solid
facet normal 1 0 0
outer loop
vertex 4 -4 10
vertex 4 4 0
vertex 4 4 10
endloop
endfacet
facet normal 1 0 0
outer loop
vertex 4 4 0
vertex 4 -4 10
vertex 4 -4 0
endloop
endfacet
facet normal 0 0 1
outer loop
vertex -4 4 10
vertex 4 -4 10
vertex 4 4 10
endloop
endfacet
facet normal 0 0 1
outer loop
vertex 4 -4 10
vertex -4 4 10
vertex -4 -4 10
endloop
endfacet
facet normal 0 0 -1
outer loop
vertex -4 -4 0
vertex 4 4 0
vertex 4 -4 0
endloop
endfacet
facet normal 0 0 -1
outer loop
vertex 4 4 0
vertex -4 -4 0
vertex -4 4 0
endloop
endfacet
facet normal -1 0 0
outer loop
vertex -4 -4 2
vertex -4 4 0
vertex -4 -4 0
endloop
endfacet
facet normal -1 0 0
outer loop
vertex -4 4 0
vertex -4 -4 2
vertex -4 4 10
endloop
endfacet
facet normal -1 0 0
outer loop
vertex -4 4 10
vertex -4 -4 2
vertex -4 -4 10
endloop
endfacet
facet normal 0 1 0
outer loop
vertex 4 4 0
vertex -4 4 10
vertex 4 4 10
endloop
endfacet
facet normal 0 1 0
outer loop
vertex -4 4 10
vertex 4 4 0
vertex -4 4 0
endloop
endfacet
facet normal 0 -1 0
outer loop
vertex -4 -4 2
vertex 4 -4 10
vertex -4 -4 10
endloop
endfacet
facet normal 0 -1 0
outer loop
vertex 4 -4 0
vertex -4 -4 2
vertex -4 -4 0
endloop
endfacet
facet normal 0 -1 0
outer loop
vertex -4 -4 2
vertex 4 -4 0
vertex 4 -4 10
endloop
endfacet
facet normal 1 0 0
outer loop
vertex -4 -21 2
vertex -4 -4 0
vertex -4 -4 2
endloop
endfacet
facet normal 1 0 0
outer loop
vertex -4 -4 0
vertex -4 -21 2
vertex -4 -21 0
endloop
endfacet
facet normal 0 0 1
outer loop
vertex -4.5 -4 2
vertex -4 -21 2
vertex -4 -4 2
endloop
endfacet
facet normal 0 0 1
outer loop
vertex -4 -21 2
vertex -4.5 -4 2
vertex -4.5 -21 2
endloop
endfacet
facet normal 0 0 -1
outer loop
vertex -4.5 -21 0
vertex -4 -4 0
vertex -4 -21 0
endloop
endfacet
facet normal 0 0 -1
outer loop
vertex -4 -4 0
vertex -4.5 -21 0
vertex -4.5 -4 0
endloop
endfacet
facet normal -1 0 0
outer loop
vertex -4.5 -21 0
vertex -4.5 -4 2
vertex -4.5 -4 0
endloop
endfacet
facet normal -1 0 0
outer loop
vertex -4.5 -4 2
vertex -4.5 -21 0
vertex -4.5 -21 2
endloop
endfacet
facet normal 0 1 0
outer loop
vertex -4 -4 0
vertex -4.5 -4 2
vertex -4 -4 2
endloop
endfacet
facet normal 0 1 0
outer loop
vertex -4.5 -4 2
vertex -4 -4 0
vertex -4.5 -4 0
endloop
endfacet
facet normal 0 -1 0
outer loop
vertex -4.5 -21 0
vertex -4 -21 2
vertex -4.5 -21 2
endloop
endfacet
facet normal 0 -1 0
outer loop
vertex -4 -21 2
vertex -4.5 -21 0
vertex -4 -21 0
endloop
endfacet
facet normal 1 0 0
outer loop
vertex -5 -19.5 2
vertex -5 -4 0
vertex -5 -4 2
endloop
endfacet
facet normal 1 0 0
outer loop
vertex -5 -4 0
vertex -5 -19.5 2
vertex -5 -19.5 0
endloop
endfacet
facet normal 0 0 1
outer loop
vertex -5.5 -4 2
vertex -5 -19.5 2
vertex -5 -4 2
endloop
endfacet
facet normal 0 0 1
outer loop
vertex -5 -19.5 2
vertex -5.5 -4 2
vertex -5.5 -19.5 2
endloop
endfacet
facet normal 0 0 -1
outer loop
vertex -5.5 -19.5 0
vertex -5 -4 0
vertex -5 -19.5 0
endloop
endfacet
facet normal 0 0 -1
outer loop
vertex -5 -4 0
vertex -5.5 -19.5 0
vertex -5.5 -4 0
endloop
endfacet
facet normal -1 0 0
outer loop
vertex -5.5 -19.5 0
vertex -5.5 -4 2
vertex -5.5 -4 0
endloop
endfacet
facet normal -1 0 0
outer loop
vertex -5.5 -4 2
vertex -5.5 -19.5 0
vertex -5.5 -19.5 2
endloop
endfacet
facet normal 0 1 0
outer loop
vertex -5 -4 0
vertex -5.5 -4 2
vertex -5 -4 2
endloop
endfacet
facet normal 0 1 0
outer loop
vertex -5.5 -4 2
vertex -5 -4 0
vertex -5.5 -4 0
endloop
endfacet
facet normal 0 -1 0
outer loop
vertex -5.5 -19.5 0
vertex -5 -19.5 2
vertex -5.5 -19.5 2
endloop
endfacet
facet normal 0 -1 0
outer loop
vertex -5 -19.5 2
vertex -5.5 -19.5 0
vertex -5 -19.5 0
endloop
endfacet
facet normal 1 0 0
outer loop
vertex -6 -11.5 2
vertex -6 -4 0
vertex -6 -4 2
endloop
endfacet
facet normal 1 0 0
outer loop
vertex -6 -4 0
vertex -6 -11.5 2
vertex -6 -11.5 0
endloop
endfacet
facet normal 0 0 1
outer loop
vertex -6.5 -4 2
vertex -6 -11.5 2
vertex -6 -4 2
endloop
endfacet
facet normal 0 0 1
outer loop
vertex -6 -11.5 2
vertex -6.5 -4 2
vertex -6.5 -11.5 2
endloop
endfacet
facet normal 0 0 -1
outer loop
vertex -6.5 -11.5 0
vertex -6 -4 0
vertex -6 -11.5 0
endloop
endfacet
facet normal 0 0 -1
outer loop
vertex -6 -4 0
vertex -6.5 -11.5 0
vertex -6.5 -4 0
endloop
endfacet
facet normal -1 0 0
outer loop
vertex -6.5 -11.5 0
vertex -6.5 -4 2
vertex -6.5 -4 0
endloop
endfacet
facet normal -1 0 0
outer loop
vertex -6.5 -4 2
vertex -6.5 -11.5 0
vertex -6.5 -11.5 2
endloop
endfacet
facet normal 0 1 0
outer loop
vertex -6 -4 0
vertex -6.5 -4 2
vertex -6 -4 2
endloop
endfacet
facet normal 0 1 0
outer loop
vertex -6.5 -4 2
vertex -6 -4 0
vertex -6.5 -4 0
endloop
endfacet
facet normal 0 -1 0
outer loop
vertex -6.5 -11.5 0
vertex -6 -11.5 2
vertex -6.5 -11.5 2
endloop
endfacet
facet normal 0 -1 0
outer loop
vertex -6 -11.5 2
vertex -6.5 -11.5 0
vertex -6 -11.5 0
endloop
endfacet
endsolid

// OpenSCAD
translate([0, 0, 5]) color([0,1,0,0.9]) cube([8, 8, 10], center=true);
translate([-4.25, -4.25, 1]) color([1,0,0]) cube([0.5, 0.5, 2], center=true);
translate([-4.25, -4.75, 1]) color([1,0,0]) cube([0.5, 0.5, 2], center=true);
translate([-4.25, -5.25, 1]) color([1,0,0]) cube([0.5, 0.5, 2], center=true);
translate([-4.25, -5.75, 1]) color([1,0,0]) cube([0.5, 0.5, 2], center=true);
translate([-4.25, -6.25, 1]) color([1,0,0]) cube([0.5, 0.5, 2], center=true);
translate([-4.25, -6.75, 1]) color([1,0,0]) cube([0.5, 0.5, 2], center=true);
translate([-4.25, -7.25, 1]) color([1,0,0]) cube([0.5, 0.5, 2], center=true);
translate([-4.25, -7.75, 1]) color([1,0,0]) cube([0.5, 0.5, 2], center=true);
translate([-4.25, -8.25, 1]) color([1,0,0]) cube([0.5, 0.5, 2], center=true);
translate([-4.25, -8.75, 1]) color([1,0,0]) cube([0.5, 0.5, 2], center=true);
translate([-4.25, -9.25, 1]) color([1,0,0]) cube([0.5, 0.5, 2], center=true);
translate([-4.25, -9.75, 1]) color([1,0,0]) cube([0.5, 0.5, 2], center=true);
translate([-4.25, -10.25, 1]) color([1,0,0]) cube([0.5, 0.5, 2], center=true);
translate([-4.25, -10.75, 1]) color([1,0,0]) cube([0.5, 0.5, 2], center=true);
translate([-4.25, -11.25, 1]) color([1,0,0]) cube([0.5, 0.5, 2], center=true);
translate([-4.25, -11.75, 1]) color([1,0,0]) cube([0.5, 0.5, 2], center=true);
translate([-4.25, -12.25, 1]) color([1,0,0]) cube([0.5, 0.5, 2], center=true);
translate([-4.25, -12.75, 1]) color([1,0,0]) cube([0.5, 0.5, 2], center=true);
translate([-4.25, -13.25, 1]) color([1,0,0]) cube([0.5, 0.5, 2], center=true);
translate([-4.25, -13.75, 1]) color([1,0,0]) cube([0.5, 0.5, 2], center=true);
translate([-4.25, -14.25, 1]) color([1,0,0]) cube([0.5, 0.5, 2], center=true);
translate([-4.25, -14.75, 1]) color([1,0,0]) cube([0.5, 0.5, 2], center=true);
translate([-4.25, -15.25, 1]) color([1,0,0]) cube([0.5, 0.5, 2], center=true);
translate([-4.25, -15.75, 1]) color([1,0,0]) cube([0.5, 0.5, 2], center=true);
translate([-4.25, -16.25, 1]) color([1,0,0]) cube([0.5, 0.5, 2], center=true);
translate([-4.25, -16.75, 1]) color([1,0,0]) cube([0.5, 0.5, 2], center=true);
translate([-4.25, -17.25, 1]) color([1,0,0]) cube([0.5, 0.5, 2], center=true);
translate([-4.25, -17.75, 1]) color([1,0,0]) cube([0.5, 0.5, 2], center=true);
translate([-4.25, -18.25, 1]) color([1,0,0]) cube([0.5, 0.5, 2], center=true);
translate([-4.25, -18.75, 1]) color([1,0,0]) cube([0.5, 0.5, 2], center=true);
translate([-4.25, -19.25, 1]) color([1,0,0]) cube([0.5, 0.5, 2], center=true);
translate([-4.25, -19.75, 1]) color([1,0,0]) cube([0.5, 0.5, 2], center=true);
translate([-4.25, -20.25, 1]) color([1,0,0]) cube([0.5, 0.5, 2], center=true);
translate([-4.25, -20.75, 1]) color([1,0,0]) cube([0.5, 0.5, 2], center=true);
translate([-5.25, -4.25, 1]) color([1,0,0]) cube([0.5, 0.5, 2], center=true);
translate([-5.25, -4.75, 1]) color([1,0,0]) cube([0.5, 0.5, 2], center=true);
translate([-5.25, -5.25, 1]) color([1,0,0]) cube([0.5, 0.5, 2], center=true);
translate([-5.25, -5.75, 1]) color([1,0,0]) cube([0.5, 0.5, 2], center=true);
translate([-5.25, -6.25, 1]) color([1,0,0]) cube([0.5, 0.5, 2], center=true);
translate([-5.25, -6.75, 1]) color([1,0,0]) cube([0.5, 0.5, 2], center=true);
translate([-5.25, -7.25, 1]) color([1,0,0]) cube([0.5, 0.5, 2], center=true);
translate([-5.25, -7.75, 1]) color([1,0,0]) cube([0.5, 0.5, 2], center=true);
translate([-5.25, -8.25, 1]) color([1,0,0]) cube([0.5, 0.5, 2], center=true);
translate([-5.25, -8.75, 1]) color([1,0,0]) cube([0.5, 0.5, 2], center=true);
translate([-5.25, -9.25, 1]) color([1,0,0]) cube([0.5, 0.5, 2], center=true);
translate([-5.25, -9.75, 1]) color([1,0,0]) cube([0.5, 0.5, 2], center=true);
translate([-5.25, -10.25, 1]) color([1,0,0]) cube([0.5, 0.5, 2], center=true);
translate([-5.25, -10.75, 1]) color([1,0,0]) cube([0.5, 0.5, 2], center=true);
translate([-5.25, -11.25, 1]) color([1,0,0]) cube([0.5, 0.5, 2], center=true);
translate([-5.25, -11.75, 1]) color([1,0,0]) cube([0.5, 0.5, 2], center=true);
translate([-5.25, -12.25, 1]) color([1,0,0]) cube([0.5, 0.5, 2], center=true);
translate([-5.25, -12.75, 1]) color([1,0,0]) cube([0.5, 0.5, 2], center=true);
translate([-5.25, -13.25, 1]) color([1,0,0]) cube([0.5, 0.5, 2], center=true);
translate([-5.25, -13.75, 1]) color([1,0,0]) cube([0.5, 0.5, 2], center=true);
translate([-5.25, -14.25, 1]) color([1,0,0]) cube([0.5, 0.5, 2], center=true);
translate([-5.25, -14.75, 1]) color([1,0,0]) cube([0.5, 0.5, 2], center=true);
translate([-5.25, -15.25, 1]) color([1,0,0]) cube([0.5, 0.5, 2], center=true);
translate([-5.25, -15.75, 1]) color([1,0,0]) cube([0.5, 0.5, 2], center=true);
translate([-5.25, -16.25, 1]) color([1,0,0]) cube([0.5, 0.5, 2], center=true);
translate([-5.25, -16.75, 1]) color([1,0,0]) cube([0.5, 0.5, 2], center=true);
translate([-5.25, -17.25, 1]) color([1,0,0]) cube([0.5, 0.5, 2], center=true);
translate([-5.25, -17.75, 1]) color([1,0,0]) cube([0.5, 0.5, 2], center=true);
translate([-5.25, -18.25, 1]) color([1,0,0]) cube([0.5, 0.5, 2], center=true);
translate([-5.25, -18.75, 1]) color([1,0,0]) cube([0.5, 0.5, 2], center=true);
translate([-5.25, -19.25, 1]) color([1,0,0]) cube([0.5, 0.5, 2], center=true);
translate([-6.25, -4.25, 1]) color([1,0,0]) cube([0.5, 0.5, 2], center=true);
translate([-6.25, -4.75, 1]) color([1,0,0]) cube([0.5, 0.5, 2], center=true);
translate([-6.25, -5.25, 1]) color([1,0,0]) cube([0.5, 0.5, 2], center=true);
translate([-6.25, -5.75, 1]) color([1,0,0]) cube([0.5, 0.5, 2], center=true);
translate([-6.25, -6.25, 1]) color([1,0,0]) cube([0.5, 0.5, 2], center=true);
translate([-6.25, -6.75, 1]) color([1,0,0]) cube([0.5, 0.5, 2], center=true);
translate([-6.25, -7.25, 1]) color([1,0,0]) cube([0.5, 0.5, 2], center=true);
translate([-6.25, -7.75, 1]) color([1,0,0]) cube([0.5, 0.5, 2], center=true);
translate([-6.25, -8.25, 1]) color([1,0,0]) cube([0.5, 0.5, 2], center=true);
translate([-6.25, -8.75, 1]) color([1,0,0]) cube([0.5, 0.5, 2], center=true);
translate([-6.25, -9.25, 1]) color([1,0,0]) cube([0.5, 0.5, 2], center=true);
translate([-6.25, -9.75, 1]) color([1,0,0]) cube([0.5, 0.5, 2], center=true);
translate([-6.25, -10.25, 1]) color([1,0,0]) cube([0.5, 0.5, 2], center=true);
translate([-6.25, -10.75, 1]) color([1,0,0]) cube([0.5, 0.5, 2], center=true);
translate([-6.25, -11.25, 1]) color([1,0,0]) cube([0.5, 0.5, 2], center=true);
